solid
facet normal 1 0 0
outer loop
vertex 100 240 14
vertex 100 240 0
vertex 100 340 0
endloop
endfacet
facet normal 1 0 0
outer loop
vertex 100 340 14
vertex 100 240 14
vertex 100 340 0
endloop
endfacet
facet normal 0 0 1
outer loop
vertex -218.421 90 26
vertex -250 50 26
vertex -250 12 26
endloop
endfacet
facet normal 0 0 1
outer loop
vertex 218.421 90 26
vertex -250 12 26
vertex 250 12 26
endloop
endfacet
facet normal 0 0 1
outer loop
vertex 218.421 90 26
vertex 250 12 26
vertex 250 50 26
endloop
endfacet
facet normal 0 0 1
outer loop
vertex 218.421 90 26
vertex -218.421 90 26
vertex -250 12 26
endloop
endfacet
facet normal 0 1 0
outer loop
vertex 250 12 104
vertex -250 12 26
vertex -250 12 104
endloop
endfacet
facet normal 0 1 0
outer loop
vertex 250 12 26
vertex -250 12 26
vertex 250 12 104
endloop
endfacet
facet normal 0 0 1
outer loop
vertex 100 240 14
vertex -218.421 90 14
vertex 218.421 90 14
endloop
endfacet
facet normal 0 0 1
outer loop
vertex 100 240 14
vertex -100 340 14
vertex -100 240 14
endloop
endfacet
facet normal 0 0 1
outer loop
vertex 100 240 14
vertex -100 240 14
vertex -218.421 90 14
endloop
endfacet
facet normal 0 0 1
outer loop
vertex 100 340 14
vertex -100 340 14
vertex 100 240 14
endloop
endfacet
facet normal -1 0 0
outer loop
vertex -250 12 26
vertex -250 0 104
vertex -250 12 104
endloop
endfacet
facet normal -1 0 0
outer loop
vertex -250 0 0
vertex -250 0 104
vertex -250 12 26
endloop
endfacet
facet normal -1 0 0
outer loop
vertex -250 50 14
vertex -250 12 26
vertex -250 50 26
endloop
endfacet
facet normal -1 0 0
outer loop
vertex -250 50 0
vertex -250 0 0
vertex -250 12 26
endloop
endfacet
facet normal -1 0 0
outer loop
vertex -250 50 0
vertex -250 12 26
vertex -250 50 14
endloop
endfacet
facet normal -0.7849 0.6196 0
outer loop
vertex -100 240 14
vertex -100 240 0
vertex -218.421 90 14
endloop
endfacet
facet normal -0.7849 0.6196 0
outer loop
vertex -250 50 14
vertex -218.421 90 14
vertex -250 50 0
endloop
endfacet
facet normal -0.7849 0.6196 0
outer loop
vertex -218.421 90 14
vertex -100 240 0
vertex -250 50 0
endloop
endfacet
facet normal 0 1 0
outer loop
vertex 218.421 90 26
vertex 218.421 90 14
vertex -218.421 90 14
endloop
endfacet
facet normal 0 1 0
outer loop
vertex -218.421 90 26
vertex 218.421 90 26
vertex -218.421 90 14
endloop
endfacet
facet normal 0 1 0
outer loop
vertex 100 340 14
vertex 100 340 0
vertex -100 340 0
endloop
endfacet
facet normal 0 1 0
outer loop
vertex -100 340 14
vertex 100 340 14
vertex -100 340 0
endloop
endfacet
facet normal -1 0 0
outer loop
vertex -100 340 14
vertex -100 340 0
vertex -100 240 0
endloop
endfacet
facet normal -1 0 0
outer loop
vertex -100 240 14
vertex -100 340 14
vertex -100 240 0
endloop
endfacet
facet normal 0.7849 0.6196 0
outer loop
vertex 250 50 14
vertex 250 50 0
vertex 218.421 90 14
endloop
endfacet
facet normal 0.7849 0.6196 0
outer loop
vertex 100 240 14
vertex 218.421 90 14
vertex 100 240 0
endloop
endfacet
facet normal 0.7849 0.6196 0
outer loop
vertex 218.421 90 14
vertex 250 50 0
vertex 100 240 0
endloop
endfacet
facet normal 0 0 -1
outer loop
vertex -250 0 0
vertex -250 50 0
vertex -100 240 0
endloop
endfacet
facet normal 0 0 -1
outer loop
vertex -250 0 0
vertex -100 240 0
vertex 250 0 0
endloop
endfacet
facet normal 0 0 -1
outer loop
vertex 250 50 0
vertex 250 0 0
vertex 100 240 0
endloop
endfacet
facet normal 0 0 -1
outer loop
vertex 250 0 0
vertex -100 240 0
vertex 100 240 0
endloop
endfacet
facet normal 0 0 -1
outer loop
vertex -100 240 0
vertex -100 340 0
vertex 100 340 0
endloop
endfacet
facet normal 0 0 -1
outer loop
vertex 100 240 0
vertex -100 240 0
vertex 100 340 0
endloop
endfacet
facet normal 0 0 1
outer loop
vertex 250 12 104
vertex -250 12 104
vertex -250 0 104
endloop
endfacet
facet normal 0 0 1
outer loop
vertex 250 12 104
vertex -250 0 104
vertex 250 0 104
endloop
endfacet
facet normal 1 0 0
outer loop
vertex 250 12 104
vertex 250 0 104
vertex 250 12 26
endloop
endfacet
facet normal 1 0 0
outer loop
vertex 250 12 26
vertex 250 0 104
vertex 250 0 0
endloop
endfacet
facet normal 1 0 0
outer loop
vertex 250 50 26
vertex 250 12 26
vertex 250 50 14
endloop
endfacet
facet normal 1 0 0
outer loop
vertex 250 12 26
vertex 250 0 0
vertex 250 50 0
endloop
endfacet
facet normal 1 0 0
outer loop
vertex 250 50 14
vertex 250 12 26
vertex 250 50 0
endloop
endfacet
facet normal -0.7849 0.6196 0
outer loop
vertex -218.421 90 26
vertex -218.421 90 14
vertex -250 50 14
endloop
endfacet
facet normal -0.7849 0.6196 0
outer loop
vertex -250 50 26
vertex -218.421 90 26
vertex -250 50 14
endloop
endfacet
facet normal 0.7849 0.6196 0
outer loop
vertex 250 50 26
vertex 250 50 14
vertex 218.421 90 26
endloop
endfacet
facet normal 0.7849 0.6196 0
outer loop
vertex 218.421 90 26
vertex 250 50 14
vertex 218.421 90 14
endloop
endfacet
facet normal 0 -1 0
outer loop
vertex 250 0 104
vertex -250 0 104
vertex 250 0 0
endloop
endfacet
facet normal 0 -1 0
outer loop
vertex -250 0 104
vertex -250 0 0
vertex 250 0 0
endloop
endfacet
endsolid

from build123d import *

# Parameters (mm, degrees)
EXTRUDE_1_DEPTH = 14
EXTRUDE_2_DEPTH = 12
SKETCH_8_W      = 500
SKETCH_8_H      = 12
EXTRUDE_5_DEPTH = 78


with BuildPart() as part:
    # 草图1 → 凸台-拉伸1 (new body)
    with BuildSketch(Plane.XY):
        Polygon((0, 0), (250, 0), (250, 50), (100, 240), (100, 340), (0, 340), (-100, 340), (-100, 240), (-250, 50), (-250, 0), align=None)
    extrude(amount=EXTRUDE_1_DEPTH)

    # 草图6 → 凸台-拉伸2 (add)
    with BuildSketch(Plane.XY.offset(14)):
        Polygon((218.421052632, 90), (-218.421052632, 90), (-250, 50), (-250, 0), (250, 0), (250, 50), align=None)
    extrude(amount=EXTRUDE_2_DEPTH)

    # 草图8 → 凸台-拉伸5 (add)
    with BuildSketch(Plane.XY.offset(26)):
        with Locations((0, 6)):
            Rectangle(SKETCH_8_W, SKETCH_8_H)
    extrude(amount=EXTRUDE_5_DEPTH)


solid = part.part
